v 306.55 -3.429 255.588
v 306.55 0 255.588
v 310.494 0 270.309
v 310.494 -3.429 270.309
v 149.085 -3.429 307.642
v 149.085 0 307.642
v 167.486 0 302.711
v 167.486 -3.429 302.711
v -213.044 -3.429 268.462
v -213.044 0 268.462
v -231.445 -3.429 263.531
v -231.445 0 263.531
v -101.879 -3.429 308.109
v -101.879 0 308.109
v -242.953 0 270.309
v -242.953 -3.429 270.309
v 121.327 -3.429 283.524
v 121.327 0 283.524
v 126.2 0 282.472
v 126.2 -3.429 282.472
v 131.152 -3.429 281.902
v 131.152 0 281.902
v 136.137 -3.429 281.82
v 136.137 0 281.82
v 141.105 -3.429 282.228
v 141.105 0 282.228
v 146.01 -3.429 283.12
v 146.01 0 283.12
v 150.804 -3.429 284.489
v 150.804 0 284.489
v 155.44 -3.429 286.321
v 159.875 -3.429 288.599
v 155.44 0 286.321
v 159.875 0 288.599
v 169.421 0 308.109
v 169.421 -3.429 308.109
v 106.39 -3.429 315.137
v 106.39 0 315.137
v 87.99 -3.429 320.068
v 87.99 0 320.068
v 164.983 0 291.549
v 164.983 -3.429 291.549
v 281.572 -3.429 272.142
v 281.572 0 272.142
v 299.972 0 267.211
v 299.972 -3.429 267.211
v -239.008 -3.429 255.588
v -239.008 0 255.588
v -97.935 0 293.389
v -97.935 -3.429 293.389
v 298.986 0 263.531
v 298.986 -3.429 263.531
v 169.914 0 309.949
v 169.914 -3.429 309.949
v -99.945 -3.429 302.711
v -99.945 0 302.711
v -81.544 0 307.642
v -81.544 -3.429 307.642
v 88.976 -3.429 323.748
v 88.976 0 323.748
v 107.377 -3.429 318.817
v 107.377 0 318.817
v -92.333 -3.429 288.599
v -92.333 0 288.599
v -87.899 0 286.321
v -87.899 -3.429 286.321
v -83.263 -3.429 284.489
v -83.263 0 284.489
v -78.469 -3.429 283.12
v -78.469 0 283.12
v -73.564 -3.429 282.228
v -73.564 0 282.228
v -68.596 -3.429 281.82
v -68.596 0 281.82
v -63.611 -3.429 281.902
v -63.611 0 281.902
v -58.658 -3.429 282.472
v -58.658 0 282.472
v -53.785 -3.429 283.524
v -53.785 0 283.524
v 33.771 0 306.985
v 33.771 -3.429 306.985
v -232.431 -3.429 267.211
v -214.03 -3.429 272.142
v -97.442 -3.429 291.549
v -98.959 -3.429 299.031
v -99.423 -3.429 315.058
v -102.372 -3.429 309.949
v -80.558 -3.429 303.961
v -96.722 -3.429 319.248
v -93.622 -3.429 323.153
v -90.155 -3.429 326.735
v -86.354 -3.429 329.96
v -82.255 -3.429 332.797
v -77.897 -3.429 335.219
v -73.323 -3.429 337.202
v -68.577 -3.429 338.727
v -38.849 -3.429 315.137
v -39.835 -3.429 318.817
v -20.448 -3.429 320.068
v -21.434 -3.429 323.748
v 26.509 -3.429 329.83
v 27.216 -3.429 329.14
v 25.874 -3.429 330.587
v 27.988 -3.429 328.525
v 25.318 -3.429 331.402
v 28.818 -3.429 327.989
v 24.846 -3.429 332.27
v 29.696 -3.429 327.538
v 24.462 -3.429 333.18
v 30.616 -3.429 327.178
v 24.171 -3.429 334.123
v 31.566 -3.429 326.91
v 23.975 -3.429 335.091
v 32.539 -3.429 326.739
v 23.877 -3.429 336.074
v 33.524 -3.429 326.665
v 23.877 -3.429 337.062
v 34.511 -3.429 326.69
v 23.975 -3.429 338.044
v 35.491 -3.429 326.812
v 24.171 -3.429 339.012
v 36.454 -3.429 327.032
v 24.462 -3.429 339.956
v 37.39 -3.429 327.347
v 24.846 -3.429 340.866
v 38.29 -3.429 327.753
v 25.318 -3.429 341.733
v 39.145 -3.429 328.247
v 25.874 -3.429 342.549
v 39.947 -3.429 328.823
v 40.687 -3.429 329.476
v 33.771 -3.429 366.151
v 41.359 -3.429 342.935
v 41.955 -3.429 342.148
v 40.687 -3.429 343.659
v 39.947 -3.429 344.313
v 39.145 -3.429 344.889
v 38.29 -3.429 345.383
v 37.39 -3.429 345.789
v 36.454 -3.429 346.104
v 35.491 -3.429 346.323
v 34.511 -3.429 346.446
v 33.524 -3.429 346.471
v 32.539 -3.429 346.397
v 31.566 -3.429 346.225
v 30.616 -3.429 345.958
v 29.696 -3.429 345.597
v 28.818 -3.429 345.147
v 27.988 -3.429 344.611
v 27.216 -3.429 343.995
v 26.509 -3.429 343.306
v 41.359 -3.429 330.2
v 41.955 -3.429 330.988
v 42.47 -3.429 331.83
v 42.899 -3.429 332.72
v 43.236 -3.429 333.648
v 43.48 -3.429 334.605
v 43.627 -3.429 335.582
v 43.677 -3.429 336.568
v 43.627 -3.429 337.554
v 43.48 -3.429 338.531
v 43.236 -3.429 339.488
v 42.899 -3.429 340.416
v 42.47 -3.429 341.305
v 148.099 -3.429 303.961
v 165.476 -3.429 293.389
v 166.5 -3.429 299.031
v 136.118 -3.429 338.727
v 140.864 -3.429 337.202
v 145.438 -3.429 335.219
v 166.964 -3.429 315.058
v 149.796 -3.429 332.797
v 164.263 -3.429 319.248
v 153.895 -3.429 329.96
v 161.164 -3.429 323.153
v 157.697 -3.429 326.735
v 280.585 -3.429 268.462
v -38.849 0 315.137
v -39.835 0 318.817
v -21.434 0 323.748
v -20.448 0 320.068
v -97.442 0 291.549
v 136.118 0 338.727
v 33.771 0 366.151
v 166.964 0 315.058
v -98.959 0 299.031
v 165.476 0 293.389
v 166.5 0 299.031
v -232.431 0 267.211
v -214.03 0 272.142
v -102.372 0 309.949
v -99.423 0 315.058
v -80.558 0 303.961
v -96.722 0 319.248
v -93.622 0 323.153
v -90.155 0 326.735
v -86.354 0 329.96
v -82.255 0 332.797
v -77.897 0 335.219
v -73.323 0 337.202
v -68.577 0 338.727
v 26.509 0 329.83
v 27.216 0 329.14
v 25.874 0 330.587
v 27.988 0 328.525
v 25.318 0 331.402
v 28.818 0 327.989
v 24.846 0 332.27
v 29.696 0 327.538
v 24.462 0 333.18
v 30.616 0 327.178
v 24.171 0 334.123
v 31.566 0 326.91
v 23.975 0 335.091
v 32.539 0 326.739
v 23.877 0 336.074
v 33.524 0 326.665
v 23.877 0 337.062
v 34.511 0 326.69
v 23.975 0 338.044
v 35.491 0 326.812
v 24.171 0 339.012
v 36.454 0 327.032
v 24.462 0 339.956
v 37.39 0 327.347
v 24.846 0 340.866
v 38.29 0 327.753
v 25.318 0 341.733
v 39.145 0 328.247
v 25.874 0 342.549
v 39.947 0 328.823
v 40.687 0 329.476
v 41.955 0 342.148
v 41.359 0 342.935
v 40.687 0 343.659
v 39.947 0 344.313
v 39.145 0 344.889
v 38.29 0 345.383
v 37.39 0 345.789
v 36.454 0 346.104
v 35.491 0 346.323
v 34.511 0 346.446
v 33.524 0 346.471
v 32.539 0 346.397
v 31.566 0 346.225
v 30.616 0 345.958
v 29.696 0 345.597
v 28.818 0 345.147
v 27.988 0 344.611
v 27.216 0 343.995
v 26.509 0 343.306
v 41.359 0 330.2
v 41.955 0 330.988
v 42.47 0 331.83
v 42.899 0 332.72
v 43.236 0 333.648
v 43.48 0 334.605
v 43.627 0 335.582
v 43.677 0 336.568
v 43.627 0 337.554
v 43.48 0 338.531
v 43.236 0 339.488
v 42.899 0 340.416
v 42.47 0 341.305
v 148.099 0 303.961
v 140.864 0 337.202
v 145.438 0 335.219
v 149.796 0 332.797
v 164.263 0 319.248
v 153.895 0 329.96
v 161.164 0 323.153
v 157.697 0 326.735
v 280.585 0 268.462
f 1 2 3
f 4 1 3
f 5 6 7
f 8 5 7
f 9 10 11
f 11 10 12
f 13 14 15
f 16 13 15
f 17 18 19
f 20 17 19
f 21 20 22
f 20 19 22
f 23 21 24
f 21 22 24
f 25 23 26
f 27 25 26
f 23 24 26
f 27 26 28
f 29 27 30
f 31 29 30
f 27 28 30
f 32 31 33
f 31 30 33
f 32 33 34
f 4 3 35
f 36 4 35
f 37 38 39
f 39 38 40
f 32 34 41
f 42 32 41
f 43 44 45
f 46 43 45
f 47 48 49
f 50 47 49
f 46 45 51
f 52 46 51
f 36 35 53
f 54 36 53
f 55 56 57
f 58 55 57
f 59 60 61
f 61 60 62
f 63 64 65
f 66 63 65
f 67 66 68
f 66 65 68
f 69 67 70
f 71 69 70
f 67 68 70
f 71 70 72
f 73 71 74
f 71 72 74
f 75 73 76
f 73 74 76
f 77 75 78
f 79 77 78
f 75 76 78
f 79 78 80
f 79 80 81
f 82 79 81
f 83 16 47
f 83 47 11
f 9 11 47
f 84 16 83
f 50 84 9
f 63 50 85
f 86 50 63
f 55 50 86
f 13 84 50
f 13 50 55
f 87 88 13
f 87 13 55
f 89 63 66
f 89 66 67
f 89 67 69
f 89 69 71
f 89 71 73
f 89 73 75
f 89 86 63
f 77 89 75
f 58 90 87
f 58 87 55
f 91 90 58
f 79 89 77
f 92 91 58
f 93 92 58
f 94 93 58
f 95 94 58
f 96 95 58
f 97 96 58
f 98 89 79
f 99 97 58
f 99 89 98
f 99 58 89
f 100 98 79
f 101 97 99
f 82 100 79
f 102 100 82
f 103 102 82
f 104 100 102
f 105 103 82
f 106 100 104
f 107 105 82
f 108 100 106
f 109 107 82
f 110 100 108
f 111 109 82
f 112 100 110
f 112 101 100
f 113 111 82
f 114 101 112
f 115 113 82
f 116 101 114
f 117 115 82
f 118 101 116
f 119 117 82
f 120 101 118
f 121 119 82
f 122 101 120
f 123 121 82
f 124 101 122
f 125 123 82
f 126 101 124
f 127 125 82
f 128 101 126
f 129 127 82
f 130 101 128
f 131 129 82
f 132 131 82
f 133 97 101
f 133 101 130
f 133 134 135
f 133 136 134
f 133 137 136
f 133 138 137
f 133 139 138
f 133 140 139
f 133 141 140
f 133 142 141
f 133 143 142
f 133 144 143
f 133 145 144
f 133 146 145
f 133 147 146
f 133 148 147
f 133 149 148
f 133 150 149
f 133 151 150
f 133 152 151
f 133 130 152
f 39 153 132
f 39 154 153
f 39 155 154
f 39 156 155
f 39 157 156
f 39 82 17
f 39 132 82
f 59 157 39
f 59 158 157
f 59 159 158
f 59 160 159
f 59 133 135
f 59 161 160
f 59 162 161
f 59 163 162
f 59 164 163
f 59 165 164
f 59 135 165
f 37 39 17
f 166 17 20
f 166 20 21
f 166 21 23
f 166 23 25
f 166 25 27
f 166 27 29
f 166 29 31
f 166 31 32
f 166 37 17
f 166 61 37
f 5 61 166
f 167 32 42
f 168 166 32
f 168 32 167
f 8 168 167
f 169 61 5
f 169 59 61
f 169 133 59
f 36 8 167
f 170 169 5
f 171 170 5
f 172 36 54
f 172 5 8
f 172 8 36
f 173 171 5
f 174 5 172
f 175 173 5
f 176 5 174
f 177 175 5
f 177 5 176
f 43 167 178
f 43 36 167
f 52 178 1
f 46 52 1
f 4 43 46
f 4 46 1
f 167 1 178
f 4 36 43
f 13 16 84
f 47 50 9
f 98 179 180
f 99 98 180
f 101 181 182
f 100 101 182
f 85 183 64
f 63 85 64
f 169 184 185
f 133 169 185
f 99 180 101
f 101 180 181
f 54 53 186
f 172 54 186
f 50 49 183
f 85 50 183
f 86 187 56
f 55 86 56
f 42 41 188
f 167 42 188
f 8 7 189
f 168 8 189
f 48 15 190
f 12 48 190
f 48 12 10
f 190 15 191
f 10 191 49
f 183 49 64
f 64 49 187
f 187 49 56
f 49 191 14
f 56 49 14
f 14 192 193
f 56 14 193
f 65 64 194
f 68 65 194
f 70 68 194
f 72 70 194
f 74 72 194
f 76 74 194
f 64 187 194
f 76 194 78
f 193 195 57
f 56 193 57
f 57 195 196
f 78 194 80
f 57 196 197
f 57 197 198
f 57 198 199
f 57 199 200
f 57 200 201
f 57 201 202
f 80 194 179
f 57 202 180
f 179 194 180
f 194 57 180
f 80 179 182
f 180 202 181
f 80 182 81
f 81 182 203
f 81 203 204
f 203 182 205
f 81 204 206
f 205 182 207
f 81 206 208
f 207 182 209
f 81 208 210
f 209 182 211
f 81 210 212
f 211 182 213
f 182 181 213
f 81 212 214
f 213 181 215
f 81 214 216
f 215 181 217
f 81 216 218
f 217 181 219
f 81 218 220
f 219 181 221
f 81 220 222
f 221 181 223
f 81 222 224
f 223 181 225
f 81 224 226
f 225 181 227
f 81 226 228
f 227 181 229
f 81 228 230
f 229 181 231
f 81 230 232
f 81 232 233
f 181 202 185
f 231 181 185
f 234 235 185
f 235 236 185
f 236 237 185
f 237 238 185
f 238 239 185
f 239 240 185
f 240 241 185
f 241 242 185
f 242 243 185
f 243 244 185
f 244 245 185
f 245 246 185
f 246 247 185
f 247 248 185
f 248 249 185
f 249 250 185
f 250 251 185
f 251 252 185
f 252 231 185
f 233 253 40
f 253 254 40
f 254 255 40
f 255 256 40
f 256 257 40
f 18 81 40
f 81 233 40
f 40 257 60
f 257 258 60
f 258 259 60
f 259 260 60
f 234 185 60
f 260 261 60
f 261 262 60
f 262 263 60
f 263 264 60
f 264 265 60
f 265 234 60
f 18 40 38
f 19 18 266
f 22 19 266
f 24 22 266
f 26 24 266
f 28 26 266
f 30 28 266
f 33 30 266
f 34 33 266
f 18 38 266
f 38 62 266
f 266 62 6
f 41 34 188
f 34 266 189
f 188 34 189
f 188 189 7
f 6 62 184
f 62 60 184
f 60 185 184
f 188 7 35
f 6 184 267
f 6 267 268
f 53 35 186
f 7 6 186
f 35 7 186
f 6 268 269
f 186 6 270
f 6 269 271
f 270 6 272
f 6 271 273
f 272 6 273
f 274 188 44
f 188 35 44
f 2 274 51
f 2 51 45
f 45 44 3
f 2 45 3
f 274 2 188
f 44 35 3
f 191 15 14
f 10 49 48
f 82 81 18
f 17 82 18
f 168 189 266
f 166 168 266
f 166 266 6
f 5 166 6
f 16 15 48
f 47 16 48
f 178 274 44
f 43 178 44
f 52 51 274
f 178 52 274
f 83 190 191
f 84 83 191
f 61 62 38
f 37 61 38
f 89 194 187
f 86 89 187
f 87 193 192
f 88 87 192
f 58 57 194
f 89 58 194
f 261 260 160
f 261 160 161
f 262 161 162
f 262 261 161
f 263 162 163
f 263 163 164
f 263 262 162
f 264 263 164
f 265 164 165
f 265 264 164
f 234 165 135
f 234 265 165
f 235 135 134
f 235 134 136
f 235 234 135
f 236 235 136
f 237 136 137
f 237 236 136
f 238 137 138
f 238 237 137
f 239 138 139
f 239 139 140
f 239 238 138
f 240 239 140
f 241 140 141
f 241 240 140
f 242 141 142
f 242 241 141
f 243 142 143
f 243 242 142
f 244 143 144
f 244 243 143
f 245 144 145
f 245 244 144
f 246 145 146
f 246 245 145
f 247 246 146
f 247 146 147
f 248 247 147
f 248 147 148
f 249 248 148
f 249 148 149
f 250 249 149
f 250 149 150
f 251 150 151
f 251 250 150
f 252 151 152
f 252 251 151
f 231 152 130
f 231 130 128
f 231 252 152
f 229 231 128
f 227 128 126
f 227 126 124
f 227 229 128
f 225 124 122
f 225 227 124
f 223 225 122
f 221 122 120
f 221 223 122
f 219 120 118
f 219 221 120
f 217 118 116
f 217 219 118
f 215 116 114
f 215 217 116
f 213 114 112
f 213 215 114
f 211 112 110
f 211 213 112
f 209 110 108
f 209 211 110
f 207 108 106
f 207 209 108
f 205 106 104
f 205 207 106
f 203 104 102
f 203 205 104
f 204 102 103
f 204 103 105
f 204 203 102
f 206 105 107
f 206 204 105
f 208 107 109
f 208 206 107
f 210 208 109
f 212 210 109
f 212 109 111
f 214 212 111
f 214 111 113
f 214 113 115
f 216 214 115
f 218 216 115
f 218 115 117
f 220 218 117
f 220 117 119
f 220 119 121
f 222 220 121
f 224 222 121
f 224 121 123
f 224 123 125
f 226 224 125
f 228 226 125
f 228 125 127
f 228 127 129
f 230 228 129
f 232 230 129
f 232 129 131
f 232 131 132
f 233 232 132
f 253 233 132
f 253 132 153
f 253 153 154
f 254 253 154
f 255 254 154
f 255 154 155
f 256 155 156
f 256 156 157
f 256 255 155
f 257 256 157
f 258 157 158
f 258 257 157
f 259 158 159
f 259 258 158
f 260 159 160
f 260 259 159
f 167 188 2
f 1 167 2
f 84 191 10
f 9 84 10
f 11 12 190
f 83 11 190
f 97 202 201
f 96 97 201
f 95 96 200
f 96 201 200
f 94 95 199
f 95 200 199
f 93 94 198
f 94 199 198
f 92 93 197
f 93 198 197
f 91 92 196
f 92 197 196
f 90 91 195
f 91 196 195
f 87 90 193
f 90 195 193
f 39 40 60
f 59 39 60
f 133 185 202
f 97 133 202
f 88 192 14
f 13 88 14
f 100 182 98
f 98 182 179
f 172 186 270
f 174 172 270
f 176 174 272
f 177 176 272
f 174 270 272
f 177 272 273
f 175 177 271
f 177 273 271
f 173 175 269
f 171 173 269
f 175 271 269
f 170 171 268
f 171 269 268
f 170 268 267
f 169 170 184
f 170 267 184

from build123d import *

# Parameters (mm, degrees)
F0_R     = 9.906
F1_DEPTH = 3.429


# Not quite as in the source:
# - ends of sketch curves that miss each other by under 0.0002 mm in the source are joined


with BuildPart() as f1:
    # F0 (on Front) → F1 (new body)
    with BuildSketch(Plane.XZ):
        with BuildLine():
            ThreePointArc((121.3266326526, 283.5242564606), (141.1053673826, 282.2278907762), (159.8746336835, 288.5991978658))
            Line((159.8746336835, 288.5991978658), (164.9830584, 291.548566))
            Line((164.9830584, 291.548566), (165.4761232, 293.3886436))
            Line((165.4761232, 293.3886436), (306.5495774, 255.588135))
            Line((306.5495774, 255.588135), (310.4939942, 270.308832))
            Line((310.4939942, 270.308832), (169.4205146, 308.109366))
            Line((169.4205146, 308.109366), (169.9135794, 309.9494436))
            Line((169.9135794, 309.9494436), (166.9642076, 315.0578916))
            ThreePointArc((166.9642076, 315.0578916), (153.8951945869, 329.9602399108), (136.1181216974, 338.7269230379))
            Line((136.1181216974, 338.7269230379), (33.7705954, 366.1508552))
            Line((33.7705954, 366.1508552), (-68.5769266, 338.726907))
            ThreePointArc((-68.5769266, 338.726907), (-86.3539881192, 329.9602324429), (-99.4229877342, 315.0578894835))
            Line((-99.4229877342, 315.0578894835), (-102.3723632, 309.9494436))
            Line((-102.3723632, 309.9494436), (-101.8792984, 308.109366))
            Line((-101.8792984, 308.109366), (-242.952778, 270.308832))
            Line((-242.952778, 270.308832), (-239.0083612, 255.588135))
            Line((-239.0083612, 255.588135), (-97.934907, 293.3886436))
            Line((-97.934907, 293.3886436), (-97.4418676, 291.548566))
            Line((-97.4418676, 291.548566), (-92.3334196, 288.5991942))
            ThreePointArc((-92.3334196, 288.5991942), (-73.5641511826, 282.2278907762), (-53.7854164526, 283.5242564606))
            Line((-53.7854164526, 283.5242564606), (33.7705954, 306.9848318))
            Line((33.7705954, 306.9848318), (121.3266326526, 283.5242564606))
        make_face()
        Polygon((-232.4312598, 267.2114544), (-214.0303568, 272.1419754), (-213.044278, 268.4617948), (-231.4451556, 263.5312992), align=None, mode=Mode.SUBTRACT)
        Polygon((-99.9448598, 302.7110786), (-81.5439822, 307.6415996), (-80.557878, 303.961419), (-98.9587556, 299.030898), align=None, mode=Mode.SUBTRACT)
        Polygon((280.5854688, 268.4617948), (281.571573, 272.1419754), (299.972476, 267.2114544), (298.9863718, 263.5312992), align=None, mode=Mode.SUBTRACT)
        Polygon((167.486076, 302.7110786), (166.4999718, 299.030898), (148.0990942, 303.961419), (149.0851984, 307.6415996), align=None, mode=Mode.SUBTRACT)
        Polygon((-39.8353026, 318.8173964), (-21.434425, 323.747892), (-20.4483208, 320.0677114), (-38.8491984, 315.1372158), align=None, mode=Mode.SUBTRACT)
        with Locations((33.7705954, 336.5678308)):
            Circle(F0_R, mode=Mode.SUBTRACT)
        Polygon((87.989537, 320.0677114), (88.9756158, 323.747892), (107.3765188, 318.8173964), (106.3904146, 315.1372158), align=None, mode=Mode.SUBTRACT)
    extrude(amount=F1_DEPTH)


solid = f1.part
